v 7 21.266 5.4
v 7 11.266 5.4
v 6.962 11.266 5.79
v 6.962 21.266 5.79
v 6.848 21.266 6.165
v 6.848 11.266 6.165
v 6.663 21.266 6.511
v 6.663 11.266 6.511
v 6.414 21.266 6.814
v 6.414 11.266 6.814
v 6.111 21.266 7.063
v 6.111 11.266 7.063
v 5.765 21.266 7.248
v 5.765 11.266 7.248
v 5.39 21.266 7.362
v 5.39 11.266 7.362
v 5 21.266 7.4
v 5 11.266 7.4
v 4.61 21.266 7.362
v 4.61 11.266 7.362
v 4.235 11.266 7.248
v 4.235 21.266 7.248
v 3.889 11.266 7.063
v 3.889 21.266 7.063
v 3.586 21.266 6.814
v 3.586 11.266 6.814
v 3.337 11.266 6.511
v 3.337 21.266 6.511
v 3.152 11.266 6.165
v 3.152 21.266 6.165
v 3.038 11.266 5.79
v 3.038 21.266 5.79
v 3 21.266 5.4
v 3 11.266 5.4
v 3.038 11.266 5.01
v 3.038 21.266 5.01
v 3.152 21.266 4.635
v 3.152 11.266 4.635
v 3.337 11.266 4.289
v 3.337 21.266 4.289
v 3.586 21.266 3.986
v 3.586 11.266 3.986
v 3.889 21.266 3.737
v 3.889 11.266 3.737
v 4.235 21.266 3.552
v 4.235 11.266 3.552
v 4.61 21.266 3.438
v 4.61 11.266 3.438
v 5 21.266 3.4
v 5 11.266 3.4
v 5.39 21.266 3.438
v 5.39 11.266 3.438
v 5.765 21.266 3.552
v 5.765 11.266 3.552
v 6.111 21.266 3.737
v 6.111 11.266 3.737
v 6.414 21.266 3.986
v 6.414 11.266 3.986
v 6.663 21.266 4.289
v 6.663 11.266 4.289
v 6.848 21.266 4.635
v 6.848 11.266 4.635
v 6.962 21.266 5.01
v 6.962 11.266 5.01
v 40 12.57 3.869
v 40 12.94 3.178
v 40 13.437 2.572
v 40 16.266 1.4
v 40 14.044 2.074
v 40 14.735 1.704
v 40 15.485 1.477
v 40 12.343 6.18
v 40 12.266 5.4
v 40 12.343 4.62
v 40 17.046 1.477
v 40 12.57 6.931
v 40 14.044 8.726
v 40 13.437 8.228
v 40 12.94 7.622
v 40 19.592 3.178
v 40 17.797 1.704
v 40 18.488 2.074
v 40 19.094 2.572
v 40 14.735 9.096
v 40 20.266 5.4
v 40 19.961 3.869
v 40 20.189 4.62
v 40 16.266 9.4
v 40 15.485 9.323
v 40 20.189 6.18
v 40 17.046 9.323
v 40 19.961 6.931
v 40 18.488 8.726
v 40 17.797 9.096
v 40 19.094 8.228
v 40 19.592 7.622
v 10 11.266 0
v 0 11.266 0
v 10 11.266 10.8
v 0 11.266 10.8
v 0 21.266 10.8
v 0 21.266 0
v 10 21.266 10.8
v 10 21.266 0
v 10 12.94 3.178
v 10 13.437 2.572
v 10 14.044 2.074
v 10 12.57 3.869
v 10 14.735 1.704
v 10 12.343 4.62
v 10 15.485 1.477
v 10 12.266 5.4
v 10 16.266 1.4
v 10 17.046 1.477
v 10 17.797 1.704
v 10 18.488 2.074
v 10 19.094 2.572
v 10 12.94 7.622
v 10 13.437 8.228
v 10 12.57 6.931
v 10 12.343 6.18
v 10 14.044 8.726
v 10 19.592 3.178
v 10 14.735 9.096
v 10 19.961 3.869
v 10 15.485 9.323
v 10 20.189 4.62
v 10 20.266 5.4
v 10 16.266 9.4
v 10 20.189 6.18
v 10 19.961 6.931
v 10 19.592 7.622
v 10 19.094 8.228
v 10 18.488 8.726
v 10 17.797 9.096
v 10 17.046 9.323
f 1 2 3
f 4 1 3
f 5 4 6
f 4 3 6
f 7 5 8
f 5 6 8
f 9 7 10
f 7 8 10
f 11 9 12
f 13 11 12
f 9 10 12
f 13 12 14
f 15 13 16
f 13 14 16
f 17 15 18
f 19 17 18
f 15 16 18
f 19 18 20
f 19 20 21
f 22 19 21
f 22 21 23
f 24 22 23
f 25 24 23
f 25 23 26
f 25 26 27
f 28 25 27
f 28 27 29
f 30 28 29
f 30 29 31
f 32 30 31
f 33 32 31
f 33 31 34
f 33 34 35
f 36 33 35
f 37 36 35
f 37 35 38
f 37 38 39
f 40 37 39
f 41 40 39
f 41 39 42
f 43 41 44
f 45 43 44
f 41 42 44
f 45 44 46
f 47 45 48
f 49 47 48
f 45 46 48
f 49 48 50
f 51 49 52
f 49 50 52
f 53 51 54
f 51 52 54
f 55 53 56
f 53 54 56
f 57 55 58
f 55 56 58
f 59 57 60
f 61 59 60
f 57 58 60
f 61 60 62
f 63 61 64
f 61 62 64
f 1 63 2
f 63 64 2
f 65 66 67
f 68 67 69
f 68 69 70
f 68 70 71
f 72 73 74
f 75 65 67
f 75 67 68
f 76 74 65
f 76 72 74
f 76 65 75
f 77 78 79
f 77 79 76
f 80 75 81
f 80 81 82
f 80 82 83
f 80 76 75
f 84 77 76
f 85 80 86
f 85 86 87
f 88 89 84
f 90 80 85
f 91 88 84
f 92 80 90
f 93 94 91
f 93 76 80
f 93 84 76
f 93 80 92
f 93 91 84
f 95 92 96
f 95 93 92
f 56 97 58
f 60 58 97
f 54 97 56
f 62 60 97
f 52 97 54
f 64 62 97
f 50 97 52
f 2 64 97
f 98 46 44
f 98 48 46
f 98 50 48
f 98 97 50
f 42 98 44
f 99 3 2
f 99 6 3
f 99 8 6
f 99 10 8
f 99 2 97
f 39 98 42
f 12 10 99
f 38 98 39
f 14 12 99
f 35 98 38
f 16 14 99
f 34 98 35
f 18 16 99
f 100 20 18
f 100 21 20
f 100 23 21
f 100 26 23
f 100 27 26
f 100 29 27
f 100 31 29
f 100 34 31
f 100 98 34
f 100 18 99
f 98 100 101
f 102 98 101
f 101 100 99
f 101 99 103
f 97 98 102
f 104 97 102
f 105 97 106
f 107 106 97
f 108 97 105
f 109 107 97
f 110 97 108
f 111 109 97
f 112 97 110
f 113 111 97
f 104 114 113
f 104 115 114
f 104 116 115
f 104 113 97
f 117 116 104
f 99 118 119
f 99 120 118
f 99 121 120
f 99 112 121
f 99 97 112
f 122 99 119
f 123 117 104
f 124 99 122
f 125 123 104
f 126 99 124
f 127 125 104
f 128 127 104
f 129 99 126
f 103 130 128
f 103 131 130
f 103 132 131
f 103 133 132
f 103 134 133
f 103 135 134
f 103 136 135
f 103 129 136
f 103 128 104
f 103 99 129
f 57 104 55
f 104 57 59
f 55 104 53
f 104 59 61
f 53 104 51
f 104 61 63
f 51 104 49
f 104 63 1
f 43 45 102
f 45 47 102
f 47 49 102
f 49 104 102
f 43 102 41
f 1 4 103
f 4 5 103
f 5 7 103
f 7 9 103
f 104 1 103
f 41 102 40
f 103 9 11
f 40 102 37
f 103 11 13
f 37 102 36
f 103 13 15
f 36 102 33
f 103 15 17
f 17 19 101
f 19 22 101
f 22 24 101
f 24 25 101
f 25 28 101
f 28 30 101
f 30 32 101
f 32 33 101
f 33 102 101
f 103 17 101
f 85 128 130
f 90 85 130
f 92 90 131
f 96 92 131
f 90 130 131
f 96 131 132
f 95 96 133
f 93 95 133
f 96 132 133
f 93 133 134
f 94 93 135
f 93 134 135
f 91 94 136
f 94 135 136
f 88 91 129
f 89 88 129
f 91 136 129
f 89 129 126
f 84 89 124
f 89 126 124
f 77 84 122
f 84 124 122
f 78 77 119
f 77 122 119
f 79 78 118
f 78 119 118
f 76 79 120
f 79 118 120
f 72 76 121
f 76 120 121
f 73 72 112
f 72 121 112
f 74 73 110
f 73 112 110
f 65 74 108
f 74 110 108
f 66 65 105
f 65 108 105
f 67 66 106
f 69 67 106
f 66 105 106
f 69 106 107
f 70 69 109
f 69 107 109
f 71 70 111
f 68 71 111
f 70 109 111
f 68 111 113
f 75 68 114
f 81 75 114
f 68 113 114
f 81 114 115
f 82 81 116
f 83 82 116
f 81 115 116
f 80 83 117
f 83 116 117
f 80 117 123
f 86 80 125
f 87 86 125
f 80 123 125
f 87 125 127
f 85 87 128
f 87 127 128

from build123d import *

# Parameters (mm, degrees)
F0_W     = 10
F0_H     = 10.8
F1_DEPTH = 10
F2_R     = 4
F3_DEPTH = 30
F4_R     = 2
F5_DEPTH = 25


with BuildPart() as f1:
    # F0 (on Right) → F1 (new body)
    with BuildSketch(Plane.YZ):
        with Locations((16.265796, 5.4)):
            Rectangle(F0_W, F0_H)
    extrude(amount=F1_DEPTH)

    # F2 (on face) → F3 (join)
    with BuildSketch(Plane.YZ.offset(10)):
        with Locations((16.265796, 5.4)):
            Circle(F2_R)
    extrude(amount=F3_DEPTH)

    # F4 (on face) → F5 (cut)
    with BuildSketch(Plane.XZ.offset(-11.265796)):
        with Locations((5, 5.4)):
            Circle(F4_R)
    extrude(amount=-F5_DEPTH, mode=Mode.SUBTRACT)


solid = f1.part
